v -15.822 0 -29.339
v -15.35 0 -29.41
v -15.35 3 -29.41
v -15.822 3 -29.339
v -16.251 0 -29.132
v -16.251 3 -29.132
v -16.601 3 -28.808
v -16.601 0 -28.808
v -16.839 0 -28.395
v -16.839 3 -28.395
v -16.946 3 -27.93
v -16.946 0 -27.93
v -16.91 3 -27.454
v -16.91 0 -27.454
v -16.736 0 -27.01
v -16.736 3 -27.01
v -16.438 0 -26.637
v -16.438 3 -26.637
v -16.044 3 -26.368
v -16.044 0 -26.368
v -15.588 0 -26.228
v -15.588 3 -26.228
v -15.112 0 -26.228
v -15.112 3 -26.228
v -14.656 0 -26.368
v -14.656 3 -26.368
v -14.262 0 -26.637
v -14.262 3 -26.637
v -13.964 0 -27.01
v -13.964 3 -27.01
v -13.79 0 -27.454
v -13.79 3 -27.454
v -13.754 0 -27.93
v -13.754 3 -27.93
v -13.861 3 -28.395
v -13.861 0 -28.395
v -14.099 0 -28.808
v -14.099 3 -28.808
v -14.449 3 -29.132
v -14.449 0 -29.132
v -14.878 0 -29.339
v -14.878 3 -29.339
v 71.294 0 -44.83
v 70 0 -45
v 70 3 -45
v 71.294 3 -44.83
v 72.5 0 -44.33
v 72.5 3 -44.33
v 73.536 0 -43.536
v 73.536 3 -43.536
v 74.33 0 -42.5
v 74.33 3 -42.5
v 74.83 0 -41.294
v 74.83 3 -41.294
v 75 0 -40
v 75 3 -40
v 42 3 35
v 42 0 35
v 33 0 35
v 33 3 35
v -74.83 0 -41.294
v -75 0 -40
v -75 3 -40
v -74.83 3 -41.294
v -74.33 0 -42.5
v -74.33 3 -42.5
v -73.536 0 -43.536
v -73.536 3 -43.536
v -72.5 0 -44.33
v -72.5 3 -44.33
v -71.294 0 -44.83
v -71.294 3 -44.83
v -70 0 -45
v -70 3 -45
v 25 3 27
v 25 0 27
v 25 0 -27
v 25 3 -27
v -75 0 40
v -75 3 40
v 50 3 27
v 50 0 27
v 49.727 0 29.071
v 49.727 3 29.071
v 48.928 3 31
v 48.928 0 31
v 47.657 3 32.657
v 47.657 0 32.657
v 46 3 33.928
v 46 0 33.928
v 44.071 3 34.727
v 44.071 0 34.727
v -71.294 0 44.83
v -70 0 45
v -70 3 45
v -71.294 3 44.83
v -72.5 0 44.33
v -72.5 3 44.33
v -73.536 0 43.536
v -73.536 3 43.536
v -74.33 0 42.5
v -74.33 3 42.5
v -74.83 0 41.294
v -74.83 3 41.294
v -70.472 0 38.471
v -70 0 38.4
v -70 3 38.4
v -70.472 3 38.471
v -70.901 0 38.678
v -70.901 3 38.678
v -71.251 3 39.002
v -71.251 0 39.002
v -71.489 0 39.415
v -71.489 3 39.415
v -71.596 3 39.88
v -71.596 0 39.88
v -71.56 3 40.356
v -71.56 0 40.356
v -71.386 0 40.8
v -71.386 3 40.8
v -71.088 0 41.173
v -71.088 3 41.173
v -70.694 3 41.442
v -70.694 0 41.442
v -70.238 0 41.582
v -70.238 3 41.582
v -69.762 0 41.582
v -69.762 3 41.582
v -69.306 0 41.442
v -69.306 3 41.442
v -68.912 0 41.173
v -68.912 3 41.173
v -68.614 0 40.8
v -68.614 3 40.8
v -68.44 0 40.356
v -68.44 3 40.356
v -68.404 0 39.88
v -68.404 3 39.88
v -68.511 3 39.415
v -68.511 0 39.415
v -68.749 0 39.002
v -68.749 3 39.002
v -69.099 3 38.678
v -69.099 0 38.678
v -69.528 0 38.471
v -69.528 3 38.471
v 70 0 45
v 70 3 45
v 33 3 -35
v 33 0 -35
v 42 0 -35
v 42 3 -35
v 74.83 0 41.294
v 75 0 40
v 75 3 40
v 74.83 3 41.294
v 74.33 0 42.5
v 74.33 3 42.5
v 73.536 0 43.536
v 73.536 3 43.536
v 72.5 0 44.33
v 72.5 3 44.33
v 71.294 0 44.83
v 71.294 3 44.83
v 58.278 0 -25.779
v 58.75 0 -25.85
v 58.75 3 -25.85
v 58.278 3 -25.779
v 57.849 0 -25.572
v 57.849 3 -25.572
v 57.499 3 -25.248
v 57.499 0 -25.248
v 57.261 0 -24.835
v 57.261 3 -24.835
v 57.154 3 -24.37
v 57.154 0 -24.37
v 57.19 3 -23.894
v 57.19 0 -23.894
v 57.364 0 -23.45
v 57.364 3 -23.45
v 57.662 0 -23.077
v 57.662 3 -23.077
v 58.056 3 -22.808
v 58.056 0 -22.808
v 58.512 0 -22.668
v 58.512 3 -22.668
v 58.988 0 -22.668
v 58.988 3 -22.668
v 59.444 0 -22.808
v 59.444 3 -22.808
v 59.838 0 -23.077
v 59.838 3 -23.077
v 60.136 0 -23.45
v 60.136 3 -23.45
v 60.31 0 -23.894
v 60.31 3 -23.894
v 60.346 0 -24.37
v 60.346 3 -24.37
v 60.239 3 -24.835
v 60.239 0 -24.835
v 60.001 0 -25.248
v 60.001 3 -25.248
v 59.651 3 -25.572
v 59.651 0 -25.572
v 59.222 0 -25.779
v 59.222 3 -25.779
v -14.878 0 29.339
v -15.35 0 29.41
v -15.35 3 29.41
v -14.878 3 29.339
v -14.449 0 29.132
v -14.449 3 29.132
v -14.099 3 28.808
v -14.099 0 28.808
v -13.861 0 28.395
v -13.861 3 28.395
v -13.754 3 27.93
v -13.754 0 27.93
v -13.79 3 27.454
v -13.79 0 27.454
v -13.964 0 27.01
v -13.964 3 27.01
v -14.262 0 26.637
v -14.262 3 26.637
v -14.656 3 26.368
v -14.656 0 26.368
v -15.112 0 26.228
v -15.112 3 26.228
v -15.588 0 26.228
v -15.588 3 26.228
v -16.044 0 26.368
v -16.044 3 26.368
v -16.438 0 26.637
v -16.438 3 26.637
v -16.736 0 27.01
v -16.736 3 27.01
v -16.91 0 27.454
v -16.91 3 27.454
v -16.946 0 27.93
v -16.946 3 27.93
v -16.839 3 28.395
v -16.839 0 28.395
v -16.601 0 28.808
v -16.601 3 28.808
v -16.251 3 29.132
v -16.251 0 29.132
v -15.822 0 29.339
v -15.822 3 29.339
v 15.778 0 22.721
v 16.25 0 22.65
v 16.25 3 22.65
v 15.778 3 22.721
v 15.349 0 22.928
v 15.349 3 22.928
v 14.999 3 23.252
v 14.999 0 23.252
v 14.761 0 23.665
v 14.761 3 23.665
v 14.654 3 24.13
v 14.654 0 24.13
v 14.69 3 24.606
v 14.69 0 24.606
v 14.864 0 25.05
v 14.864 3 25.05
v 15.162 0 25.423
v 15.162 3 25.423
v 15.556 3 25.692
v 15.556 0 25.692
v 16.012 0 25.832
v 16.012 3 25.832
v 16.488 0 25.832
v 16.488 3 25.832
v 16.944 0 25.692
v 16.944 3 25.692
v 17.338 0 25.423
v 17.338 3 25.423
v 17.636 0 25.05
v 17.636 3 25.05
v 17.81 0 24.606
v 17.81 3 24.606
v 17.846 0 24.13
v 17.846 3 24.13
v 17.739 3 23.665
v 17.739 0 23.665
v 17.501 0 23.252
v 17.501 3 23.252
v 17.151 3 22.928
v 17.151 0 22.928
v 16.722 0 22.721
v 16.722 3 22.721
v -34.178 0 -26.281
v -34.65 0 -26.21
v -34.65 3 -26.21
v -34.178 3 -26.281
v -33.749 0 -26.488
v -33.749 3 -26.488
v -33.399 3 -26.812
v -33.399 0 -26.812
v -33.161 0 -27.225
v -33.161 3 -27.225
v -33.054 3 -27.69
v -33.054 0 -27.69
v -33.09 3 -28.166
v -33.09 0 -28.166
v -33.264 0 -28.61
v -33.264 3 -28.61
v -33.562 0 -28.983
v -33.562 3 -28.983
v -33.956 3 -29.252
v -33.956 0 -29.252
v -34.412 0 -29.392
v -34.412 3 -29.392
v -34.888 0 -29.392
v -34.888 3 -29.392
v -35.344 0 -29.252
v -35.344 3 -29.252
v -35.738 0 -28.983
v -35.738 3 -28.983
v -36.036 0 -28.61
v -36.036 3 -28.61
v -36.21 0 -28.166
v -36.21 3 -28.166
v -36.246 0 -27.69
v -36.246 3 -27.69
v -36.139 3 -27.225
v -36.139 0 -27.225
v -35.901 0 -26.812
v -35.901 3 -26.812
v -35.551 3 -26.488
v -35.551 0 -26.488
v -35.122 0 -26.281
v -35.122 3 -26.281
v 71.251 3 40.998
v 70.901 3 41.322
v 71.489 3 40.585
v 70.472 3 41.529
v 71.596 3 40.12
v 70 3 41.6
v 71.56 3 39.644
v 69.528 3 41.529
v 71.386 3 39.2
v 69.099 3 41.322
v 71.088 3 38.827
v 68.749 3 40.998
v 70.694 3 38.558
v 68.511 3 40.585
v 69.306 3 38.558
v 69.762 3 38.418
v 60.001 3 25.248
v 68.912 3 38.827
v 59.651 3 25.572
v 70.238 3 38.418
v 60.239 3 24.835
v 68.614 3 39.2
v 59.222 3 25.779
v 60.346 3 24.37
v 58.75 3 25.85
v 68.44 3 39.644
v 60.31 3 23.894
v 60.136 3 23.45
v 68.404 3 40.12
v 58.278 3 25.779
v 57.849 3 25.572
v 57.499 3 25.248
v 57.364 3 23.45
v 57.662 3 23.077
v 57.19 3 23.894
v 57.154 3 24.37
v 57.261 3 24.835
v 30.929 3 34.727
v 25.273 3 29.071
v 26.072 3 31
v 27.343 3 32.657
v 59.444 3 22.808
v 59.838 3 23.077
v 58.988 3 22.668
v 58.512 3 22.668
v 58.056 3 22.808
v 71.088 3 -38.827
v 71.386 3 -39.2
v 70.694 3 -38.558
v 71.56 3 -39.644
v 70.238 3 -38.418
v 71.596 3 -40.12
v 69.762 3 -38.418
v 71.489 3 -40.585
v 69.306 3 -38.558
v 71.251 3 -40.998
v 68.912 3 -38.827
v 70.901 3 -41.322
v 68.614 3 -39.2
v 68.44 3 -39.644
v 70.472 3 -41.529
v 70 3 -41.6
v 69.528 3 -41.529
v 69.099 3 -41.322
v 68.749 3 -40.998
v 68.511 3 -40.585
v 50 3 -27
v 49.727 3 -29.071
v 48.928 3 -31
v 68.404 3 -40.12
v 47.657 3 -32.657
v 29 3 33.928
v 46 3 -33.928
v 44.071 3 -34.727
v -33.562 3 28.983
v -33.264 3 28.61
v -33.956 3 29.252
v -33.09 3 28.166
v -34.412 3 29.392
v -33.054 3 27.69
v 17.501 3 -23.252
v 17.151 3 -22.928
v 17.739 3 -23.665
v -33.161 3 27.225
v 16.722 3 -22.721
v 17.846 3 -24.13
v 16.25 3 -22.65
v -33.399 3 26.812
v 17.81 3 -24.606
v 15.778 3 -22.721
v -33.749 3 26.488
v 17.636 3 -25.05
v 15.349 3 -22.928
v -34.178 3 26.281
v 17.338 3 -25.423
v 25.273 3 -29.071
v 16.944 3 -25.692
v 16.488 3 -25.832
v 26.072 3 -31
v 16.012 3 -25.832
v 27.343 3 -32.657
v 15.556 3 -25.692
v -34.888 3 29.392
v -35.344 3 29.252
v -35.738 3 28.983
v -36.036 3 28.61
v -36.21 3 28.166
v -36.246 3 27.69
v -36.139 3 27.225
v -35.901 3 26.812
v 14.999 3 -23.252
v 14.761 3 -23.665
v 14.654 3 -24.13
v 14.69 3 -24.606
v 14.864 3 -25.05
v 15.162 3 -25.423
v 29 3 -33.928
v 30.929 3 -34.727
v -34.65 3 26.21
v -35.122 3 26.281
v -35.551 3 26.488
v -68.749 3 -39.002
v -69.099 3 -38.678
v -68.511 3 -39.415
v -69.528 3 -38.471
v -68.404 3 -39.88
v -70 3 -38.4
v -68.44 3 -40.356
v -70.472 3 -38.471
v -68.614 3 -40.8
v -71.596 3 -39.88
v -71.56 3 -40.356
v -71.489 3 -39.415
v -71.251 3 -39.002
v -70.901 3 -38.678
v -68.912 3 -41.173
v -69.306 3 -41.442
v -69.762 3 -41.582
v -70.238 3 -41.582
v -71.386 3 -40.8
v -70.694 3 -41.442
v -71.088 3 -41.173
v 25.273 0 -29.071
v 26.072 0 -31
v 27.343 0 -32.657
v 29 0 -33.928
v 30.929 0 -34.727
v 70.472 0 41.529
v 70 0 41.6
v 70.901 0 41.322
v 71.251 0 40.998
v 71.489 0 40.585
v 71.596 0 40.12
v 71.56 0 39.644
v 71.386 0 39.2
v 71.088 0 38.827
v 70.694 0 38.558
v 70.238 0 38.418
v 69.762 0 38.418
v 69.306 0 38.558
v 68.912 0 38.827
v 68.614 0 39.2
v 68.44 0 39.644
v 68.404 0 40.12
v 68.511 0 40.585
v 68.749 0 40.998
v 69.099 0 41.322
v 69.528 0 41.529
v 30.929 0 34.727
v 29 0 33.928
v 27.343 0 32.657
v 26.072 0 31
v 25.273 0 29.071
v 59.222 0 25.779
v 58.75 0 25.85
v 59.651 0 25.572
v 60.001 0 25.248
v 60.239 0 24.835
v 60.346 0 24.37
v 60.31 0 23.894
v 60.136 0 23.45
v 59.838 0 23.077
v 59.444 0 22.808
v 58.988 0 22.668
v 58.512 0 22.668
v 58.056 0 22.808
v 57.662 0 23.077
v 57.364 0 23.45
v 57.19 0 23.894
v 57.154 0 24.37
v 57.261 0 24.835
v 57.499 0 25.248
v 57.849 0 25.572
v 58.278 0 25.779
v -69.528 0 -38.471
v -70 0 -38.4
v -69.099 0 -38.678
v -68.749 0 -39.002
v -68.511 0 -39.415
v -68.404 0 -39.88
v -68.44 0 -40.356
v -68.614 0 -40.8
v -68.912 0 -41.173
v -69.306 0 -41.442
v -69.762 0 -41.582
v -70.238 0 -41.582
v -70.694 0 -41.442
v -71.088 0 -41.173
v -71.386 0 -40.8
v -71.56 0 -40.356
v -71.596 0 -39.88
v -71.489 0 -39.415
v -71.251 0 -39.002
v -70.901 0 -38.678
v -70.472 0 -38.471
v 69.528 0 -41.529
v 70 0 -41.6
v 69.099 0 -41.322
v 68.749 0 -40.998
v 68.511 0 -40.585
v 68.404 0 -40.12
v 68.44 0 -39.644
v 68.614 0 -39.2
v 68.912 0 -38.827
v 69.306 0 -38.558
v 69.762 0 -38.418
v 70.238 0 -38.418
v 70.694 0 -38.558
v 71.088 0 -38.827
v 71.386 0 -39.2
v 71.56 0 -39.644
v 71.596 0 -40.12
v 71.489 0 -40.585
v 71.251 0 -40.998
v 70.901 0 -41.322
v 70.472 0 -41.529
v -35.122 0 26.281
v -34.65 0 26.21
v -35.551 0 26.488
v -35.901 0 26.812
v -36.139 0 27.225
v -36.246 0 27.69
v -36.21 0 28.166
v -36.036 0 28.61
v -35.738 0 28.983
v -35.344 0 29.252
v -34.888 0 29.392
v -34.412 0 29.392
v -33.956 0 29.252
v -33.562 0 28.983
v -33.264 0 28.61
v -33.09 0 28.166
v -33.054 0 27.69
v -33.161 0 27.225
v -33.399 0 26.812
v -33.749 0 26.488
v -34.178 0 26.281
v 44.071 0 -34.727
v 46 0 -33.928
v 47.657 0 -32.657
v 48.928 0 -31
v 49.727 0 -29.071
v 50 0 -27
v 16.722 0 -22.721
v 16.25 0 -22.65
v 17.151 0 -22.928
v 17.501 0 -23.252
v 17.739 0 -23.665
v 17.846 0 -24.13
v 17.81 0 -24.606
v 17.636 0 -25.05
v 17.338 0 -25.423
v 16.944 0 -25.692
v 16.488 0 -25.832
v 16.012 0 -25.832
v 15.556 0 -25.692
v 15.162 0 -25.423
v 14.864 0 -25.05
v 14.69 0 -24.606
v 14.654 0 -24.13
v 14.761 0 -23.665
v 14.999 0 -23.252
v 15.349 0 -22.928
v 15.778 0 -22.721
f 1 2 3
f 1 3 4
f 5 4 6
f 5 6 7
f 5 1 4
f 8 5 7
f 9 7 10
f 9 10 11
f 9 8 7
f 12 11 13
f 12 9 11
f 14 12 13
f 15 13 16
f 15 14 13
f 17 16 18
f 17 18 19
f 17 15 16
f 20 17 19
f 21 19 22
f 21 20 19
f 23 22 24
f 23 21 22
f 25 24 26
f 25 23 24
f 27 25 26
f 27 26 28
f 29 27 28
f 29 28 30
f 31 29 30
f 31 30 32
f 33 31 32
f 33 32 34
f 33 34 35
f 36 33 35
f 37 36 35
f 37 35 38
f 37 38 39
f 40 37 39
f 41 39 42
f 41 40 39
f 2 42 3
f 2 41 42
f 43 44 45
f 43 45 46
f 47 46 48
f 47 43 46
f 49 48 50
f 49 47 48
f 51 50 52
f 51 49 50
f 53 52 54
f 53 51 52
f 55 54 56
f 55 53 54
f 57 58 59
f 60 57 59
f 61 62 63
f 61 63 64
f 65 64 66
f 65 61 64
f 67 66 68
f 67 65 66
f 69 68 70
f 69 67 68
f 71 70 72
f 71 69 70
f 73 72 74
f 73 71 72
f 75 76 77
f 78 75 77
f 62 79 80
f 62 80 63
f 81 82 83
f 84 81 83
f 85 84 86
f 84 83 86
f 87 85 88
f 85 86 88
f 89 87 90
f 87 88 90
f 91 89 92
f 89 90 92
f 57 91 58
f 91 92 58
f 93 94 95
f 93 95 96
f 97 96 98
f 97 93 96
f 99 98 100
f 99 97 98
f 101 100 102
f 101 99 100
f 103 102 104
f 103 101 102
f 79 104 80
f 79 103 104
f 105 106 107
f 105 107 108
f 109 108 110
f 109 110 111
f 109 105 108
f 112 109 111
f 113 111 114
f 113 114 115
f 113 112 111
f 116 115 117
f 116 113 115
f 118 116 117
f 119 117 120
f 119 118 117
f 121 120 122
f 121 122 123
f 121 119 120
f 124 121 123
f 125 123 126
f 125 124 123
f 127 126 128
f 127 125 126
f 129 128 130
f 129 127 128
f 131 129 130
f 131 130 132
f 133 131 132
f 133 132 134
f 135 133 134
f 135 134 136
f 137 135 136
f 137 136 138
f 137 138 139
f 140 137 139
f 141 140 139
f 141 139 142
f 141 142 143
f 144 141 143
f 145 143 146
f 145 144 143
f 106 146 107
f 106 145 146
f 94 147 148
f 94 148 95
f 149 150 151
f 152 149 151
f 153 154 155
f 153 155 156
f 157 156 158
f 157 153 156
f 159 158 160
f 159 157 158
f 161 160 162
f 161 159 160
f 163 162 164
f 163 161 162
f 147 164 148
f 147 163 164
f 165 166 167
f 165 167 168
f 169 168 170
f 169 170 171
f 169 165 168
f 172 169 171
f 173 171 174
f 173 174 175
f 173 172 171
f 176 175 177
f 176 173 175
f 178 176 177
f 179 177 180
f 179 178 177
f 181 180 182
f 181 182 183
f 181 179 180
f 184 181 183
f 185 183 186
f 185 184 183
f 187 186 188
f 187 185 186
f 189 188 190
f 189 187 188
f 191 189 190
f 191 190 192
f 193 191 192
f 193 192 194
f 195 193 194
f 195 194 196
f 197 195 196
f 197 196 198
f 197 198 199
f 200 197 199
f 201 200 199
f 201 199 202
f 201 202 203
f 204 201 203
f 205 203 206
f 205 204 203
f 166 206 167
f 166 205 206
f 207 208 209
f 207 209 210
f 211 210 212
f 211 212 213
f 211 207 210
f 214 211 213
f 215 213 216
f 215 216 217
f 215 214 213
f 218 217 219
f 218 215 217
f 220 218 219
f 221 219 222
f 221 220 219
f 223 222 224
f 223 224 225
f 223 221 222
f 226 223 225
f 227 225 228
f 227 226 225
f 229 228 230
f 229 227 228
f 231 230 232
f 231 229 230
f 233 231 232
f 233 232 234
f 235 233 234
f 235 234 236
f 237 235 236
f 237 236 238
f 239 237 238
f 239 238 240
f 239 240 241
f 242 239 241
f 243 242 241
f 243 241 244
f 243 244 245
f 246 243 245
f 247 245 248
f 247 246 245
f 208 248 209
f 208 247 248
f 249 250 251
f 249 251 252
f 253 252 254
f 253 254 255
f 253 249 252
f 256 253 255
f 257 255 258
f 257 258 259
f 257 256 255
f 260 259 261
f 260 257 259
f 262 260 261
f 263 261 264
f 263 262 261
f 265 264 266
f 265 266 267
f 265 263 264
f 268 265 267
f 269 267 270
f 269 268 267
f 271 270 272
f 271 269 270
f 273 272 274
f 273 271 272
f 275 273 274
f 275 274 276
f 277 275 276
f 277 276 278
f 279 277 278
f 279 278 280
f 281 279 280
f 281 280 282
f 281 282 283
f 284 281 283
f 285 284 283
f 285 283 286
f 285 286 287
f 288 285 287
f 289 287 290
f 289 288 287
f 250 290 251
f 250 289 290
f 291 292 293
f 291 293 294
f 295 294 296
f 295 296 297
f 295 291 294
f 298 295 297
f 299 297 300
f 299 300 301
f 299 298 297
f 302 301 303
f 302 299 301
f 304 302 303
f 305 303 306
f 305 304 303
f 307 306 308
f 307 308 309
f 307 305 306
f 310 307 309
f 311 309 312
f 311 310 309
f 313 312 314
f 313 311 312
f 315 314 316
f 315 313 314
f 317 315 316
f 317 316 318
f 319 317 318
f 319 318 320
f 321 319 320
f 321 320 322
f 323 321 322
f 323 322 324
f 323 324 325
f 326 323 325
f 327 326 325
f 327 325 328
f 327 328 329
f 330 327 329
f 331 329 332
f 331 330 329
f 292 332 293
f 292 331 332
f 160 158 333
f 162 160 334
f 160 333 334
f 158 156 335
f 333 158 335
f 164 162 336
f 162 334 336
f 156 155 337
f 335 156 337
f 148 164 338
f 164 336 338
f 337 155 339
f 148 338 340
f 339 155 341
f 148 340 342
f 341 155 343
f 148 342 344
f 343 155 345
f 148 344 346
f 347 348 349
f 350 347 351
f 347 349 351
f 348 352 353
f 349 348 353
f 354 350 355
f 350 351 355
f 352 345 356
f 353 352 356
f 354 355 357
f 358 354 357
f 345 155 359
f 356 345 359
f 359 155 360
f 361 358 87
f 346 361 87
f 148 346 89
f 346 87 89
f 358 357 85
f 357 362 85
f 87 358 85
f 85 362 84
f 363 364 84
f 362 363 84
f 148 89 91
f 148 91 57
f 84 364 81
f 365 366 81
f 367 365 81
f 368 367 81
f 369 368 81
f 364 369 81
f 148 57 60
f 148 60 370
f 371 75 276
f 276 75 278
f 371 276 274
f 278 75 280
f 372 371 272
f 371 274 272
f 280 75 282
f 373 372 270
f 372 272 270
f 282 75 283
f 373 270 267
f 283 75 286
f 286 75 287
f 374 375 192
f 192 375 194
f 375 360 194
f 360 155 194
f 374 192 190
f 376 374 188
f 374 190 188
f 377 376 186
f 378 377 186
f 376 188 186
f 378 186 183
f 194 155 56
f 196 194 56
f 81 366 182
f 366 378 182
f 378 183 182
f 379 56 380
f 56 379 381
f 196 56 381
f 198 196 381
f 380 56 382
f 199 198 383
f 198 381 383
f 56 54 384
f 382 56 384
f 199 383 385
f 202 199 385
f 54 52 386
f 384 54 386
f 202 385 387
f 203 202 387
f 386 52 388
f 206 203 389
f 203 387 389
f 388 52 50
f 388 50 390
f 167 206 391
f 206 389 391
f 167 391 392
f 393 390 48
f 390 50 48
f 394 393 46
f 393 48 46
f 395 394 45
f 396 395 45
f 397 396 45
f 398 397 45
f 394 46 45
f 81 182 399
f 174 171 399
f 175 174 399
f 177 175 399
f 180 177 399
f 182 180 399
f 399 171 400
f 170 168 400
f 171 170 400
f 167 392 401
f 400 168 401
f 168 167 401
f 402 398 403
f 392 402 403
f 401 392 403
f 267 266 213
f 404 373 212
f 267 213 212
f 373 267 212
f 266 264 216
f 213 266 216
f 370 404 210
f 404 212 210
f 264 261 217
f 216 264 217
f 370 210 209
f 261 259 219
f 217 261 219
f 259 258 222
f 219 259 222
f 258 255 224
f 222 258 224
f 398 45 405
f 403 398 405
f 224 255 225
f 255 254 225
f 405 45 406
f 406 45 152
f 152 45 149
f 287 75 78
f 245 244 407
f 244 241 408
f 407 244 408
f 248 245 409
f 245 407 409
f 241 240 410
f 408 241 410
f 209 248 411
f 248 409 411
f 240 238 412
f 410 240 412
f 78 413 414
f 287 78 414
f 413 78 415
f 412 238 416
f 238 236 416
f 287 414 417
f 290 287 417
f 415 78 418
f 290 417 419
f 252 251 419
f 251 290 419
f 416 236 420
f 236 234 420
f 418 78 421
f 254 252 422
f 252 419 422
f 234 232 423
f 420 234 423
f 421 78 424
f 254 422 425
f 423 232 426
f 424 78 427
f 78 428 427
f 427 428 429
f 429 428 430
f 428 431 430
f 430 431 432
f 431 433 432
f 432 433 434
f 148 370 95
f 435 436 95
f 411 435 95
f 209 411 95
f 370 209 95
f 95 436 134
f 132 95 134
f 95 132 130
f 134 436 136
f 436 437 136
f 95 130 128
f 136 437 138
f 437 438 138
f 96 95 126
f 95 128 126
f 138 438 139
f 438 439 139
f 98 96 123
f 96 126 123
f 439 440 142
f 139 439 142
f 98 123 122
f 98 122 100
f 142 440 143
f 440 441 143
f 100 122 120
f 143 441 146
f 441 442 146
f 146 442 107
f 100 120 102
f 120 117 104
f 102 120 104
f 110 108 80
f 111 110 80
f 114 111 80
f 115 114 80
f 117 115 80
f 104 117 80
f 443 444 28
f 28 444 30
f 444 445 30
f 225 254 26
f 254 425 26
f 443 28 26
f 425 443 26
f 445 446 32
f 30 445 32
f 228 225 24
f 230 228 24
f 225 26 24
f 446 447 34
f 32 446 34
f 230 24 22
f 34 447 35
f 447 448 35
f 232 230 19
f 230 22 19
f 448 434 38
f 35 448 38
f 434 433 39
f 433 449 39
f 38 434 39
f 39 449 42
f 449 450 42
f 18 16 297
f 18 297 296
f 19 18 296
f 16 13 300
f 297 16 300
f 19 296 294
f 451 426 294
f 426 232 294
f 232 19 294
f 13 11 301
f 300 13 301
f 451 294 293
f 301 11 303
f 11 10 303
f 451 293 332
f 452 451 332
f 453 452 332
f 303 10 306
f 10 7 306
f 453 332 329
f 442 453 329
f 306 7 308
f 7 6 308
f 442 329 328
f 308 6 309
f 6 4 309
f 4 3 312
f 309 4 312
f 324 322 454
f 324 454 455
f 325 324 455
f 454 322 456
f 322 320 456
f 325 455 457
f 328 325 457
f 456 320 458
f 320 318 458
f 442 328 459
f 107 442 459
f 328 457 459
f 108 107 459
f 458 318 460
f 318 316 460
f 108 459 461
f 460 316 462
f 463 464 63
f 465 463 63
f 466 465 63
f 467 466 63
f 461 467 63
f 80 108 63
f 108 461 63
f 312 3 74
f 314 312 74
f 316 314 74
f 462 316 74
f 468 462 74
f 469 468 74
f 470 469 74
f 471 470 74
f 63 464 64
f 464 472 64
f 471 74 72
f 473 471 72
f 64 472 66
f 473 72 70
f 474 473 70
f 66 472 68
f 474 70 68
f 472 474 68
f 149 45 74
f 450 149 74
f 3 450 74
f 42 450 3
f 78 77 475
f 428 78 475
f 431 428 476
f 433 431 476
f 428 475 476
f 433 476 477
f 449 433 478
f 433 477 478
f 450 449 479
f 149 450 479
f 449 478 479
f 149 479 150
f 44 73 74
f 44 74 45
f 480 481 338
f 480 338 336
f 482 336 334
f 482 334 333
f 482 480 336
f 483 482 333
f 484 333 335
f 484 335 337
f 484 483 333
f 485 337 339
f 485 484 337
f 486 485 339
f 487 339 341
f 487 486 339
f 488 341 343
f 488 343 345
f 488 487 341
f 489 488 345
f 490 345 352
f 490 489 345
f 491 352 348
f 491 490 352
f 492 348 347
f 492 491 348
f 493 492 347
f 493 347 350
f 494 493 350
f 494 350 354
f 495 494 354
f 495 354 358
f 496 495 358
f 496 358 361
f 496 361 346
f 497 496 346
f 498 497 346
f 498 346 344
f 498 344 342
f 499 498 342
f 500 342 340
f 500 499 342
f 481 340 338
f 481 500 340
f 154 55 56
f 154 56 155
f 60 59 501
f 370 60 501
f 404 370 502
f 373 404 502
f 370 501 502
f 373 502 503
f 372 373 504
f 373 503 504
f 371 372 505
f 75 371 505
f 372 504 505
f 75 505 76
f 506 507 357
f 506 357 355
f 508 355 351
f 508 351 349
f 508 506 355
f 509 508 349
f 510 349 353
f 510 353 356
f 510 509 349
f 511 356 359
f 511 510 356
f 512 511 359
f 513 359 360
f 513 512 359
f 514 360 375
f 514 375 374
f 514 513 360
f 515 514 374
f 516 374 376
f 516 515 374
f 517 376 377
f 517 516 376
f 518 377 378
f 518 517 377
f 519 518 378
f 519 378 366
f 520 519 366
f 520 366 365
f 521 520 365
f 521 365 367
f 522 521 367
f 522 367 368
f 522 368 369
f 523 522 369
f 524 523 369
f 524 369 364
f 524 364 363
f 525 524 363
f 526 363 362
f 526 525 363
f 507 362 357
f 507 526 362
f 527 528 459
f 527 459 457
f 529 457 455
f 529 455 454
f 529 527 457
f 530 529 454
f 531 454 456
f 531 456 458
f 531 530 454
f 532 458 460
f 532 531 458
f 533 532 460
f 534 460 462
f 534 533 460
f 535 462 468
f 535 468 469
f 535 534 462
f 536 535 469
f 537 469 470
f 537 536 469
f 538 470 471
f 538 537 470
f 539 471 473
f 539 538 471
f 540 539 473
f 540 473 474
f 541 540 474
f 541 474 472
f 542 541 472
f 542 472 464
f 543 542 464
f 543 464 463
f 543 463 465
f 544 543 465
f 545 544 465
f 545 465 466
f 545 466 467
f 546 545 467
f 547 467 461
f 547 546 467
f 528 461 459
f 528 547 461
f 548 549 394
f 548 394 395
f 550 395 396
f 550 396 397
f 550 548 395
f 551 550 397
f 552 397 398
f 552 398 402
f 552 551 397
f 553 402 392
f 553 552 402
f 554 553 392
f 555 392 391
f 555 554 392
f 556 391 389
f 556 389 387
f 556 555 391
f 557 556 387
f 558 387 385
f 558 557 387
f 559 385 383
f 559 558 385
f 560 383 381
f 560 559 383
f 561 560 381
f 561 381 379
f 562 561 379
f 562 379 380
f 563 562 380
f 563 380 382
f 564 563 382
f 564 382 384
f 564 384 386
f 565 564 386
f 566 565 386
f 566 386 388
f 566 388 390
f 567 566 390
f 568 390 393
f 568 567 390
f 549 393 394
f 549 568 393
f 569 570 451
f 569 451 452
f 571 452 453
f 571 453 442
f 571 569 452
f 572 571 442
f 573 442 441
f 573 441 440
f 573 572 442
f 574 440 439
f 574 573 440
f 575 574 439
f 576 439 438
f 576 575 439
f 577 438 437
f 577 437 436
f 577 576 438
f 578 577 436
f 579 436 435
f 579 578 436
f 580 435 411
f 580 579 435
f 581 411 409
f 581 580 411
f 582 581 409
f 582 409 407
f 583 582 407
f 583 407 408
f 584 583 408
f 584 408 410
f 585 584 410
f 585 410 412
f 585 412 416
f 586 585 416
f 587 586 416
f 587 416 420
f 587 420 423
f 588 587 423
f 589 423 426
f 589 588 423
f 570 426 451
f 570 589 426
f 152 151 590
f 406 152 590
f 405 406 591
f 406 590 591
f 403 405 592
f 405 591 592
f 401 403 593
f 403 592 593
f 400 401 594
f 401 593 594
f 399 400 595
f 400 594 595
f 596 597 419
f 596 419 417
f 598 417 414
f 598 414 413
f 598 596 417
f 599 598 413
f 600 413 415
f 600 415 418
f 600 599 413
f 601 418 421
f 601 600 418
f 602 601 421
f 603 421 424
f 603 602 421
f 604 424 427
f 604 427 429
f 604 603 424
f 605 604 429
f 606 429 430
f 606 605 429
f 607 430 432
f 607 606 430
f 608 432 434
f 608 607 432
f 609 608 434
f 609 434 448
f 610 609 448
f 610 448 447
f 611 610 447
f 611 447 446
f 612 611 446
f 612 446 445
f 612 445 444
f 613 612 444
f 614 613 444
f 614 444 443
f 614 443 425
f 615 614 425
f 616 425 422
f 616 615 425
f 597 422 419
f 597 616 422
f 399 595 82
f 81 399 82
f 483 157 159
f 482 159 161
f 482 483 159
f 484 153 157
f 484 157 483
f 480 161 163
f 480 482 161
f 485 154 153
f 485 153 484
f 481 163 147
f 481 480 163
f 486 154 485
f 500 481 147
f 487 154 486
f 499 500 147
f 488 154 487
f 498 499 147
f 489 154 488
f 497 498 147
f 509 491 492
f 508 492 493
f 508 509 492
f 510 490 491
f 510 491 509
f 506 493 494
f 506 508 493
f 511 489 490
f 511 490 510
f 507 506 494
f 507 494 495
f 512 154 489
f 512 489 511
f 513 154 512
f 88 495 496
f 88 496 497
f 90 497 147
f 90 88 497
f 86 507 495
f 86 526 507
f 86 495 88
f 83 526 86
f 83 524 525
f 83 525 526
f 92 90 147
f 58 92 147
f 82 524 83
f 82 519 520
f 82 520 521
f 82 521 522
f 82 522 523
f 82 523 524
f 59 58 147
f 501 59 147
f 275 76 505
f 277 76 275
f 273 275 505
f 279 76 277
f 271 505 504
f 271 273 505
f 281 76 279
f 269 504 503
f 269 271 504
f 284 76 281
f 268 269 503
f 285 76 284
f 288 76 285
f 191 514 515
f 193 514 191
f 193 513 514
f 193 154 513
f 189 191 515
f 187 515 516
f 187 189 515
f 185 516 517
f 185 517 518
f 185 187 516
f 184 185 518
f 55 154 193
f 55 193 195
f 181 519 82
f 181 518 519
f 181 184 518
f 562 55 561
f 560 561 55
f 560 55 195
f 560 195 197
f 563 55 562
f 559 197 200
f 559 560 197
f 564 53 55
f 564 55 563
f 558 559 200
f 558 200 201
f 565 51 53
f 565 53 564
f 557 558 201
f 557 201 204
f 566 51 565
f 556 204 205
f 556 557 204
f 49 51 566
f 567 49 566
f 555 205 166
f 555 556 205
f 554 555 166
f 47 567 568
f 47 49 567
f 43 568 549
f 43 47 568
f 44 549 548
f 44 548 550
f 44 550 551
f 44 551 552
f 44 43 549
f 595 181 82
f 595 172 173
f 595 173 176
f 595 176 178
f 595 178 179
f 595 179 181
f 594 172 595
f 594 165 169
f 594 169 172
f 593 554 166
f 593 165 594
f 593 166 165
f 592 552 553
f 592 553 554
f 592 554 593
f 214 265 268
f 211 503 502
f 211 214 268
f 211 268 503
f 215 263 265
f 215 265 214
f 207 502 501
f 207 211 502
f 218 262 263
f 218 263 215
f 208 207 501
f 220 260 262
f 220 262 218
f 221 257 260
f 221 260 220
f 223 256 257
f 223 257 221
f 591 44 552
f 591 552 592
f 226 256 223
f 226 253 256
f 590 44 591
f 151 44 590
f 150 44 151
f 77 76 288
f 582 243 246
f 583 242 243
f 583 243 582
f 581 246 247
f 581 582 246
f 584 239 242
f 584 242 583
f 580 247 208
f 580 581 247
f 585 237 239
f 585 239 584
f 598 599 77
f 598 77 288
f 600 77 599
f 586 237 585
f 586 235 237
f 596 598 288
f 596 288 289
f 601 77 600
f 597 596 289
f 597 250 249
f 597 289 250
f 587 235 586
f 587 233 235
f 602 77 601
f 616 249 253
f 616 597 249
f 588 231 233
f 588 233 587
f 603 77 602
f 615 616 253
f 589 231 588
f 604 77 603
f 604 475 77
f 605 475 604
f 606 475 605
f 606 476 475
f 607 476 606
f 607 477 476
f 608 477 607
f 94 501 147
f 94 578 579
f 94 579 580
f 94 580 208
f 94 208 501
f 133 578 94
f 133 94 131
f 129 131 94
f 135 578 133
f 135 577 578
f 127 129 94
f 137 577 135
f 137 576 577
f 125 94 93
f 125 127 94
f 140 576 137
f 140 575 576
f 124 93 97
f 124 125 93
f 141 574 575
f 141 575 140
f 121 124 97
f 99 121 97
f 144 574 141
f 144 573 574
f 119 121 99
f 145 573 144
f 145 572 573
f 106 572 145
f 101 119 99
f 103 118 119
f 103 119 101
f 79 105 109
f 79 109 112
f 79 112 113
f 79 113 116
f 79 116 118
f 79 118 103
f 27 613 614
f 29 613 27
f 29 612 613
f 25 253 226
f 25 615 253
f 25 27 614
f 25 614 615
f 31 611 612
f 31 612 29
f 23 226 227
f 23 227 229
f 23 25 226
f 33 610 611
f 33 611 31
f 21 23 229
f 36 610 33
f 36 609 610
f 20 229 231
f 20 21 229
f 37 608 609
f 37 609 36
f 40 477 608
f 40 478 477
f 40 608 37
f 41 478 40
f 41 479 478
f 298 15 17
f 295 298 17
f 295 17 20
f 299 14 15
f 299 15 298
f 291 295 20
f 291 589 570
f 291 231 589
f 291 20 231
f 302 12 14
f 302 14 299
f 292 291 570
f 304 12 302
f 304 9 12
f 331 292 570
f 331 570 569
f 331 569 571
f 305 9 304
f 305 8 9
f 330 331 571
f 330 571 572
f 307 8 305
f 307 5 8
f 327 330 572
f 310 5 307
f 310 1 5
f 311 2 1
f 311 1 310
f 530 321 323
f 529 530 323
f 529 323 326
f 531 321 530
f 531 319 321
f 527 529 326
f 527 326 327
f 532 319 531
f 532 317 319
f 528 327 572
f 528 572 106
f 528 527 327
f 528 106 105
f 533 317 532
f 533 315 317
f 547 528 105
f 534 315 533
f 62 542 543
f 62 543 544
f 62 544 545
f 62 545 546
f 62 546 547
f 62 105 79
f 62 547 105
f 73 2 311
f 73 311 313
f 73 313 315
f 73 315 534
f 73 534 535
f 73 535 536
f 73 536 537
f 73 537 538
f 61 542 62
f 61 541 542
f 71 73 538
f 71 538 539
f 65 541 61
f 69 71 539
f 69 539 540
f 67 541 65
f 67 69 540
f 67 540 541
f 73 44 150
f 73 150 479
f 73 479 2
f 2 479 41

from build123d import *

# Parameters (mm, degrees)
SKETCH1_R           = 1.6
BOSS_EXTRUDE2_DEPTH = 3


with BuildPart() as part:
    # Sketch1 → Boss-Extrude2 (new body)
    with BuildSketch(Plane(origin=(0, 0, 0), x_dir=(1, 0, 0), z_dir=(0, 1, 0))):
        with BuildLine():
            Line((-70, 45), (70, 45))
            ThreePointArc((70, 45), (73.535533906, 43.535533906), (75, 40))
            Line((75, 40), (75, -40))
            ThreePointArc((75, -40), (73.535533906, -43.535533906), (70, -45))
            Line((70, -45), (-70, -45))
            ThreePointArc((-70, -45), (-73.535533906, -43.535533906), (-75, -40))
            Line((-75, -40), (-75, 40))
            ThreePointArc((-75, 40), (-73.535533906, 43.535533906), (-70, 45))
        make_face()
        with Locations(Location((16.25, 24.25, 0), (0, 0, 270))):
            Circle(SKETCH1_R, mode=Mode.SUBTRACT)
        with Locations(Location((58.75, 24.25, 0), (0, 0, 90))):
            Circle(SKETCH1_R, mode=Mode.SUBTRACT)
        with Locations(Location((58.75, -24.25, 0), (0, 0, 270))):
            Circle(SKETCH1_R, mode=Mode.SUBTRACT)
        with Locations(Location((16.25, -24.25, 0), (0, 0, 90))):
            Circle(SKETCH1_R, mode=Mode.SUBTRACT)
        with Locations(Location((-34.65, 27.81, 0), (0, 0, 270))):
            Circle(SKETCH1_R, mode=Mode.SUBTRACT)
        with Locations(Location((-15.35, 27.81, 0), (0, 0, 90))):
            Circle(SKETCH1_R, mode=Mode.SUBTRACT)
        with Locations(Location((-15.35, -27.81, 0), (0, 0, 270))):
            Circle(SKETCH1_R, mode=Mode.SUBTRACT)
        with Locations(Location((-34.65, -27.81, 0), (0, 0, 90))):
            Circle(SKETCH1_R, mode=Mode.SUBTRACT)
        with Locations(Location((-70, 40, 0), (0, 0, 270))):
            Circle(SKETCH1_R, mode=Mode.SUBTRACT)
        with Locations(Location((-70, -40, 0), (0, 0, 90))):
            Circle(SKETCH1_R, mode=Mode.SUBTRACT)
        with Locations(Location((70, 40, 0), (0, 0, 90))):
            Circle(SKETCH1_R, mode=Mode.SUBTRACT)
        with Locations(Location((70, -40, 0), (0, 0, 270))):
            Circle(SKETCH1_R, mode=Mode.SUBTRACT)
        with BuildLine():
            Line((33, 35), (42, 35))
            ThreePointArc((42, 35), (47.656854249, 32.656854249), (50, 27))
            Line((50, 27), (50, -27))
            ThreePointArc((50, -27), (47.656854249, -32.656854249), (42, -35))
            Line((42, -35), (33, -35))
            ThreePointArc((33, -35), (27.343145751, -32.656854249), (25, -27))
            Line((25, -27), (25, 27))
            ThreePointArc((25, 27), (27.343145751, 32.656854249), (33, 35))
        make_face(mode=Mode.SUBTRACT)
    extrude(amount=BOSS_EXTRUDE2_DEPTH)


solid = part.part
